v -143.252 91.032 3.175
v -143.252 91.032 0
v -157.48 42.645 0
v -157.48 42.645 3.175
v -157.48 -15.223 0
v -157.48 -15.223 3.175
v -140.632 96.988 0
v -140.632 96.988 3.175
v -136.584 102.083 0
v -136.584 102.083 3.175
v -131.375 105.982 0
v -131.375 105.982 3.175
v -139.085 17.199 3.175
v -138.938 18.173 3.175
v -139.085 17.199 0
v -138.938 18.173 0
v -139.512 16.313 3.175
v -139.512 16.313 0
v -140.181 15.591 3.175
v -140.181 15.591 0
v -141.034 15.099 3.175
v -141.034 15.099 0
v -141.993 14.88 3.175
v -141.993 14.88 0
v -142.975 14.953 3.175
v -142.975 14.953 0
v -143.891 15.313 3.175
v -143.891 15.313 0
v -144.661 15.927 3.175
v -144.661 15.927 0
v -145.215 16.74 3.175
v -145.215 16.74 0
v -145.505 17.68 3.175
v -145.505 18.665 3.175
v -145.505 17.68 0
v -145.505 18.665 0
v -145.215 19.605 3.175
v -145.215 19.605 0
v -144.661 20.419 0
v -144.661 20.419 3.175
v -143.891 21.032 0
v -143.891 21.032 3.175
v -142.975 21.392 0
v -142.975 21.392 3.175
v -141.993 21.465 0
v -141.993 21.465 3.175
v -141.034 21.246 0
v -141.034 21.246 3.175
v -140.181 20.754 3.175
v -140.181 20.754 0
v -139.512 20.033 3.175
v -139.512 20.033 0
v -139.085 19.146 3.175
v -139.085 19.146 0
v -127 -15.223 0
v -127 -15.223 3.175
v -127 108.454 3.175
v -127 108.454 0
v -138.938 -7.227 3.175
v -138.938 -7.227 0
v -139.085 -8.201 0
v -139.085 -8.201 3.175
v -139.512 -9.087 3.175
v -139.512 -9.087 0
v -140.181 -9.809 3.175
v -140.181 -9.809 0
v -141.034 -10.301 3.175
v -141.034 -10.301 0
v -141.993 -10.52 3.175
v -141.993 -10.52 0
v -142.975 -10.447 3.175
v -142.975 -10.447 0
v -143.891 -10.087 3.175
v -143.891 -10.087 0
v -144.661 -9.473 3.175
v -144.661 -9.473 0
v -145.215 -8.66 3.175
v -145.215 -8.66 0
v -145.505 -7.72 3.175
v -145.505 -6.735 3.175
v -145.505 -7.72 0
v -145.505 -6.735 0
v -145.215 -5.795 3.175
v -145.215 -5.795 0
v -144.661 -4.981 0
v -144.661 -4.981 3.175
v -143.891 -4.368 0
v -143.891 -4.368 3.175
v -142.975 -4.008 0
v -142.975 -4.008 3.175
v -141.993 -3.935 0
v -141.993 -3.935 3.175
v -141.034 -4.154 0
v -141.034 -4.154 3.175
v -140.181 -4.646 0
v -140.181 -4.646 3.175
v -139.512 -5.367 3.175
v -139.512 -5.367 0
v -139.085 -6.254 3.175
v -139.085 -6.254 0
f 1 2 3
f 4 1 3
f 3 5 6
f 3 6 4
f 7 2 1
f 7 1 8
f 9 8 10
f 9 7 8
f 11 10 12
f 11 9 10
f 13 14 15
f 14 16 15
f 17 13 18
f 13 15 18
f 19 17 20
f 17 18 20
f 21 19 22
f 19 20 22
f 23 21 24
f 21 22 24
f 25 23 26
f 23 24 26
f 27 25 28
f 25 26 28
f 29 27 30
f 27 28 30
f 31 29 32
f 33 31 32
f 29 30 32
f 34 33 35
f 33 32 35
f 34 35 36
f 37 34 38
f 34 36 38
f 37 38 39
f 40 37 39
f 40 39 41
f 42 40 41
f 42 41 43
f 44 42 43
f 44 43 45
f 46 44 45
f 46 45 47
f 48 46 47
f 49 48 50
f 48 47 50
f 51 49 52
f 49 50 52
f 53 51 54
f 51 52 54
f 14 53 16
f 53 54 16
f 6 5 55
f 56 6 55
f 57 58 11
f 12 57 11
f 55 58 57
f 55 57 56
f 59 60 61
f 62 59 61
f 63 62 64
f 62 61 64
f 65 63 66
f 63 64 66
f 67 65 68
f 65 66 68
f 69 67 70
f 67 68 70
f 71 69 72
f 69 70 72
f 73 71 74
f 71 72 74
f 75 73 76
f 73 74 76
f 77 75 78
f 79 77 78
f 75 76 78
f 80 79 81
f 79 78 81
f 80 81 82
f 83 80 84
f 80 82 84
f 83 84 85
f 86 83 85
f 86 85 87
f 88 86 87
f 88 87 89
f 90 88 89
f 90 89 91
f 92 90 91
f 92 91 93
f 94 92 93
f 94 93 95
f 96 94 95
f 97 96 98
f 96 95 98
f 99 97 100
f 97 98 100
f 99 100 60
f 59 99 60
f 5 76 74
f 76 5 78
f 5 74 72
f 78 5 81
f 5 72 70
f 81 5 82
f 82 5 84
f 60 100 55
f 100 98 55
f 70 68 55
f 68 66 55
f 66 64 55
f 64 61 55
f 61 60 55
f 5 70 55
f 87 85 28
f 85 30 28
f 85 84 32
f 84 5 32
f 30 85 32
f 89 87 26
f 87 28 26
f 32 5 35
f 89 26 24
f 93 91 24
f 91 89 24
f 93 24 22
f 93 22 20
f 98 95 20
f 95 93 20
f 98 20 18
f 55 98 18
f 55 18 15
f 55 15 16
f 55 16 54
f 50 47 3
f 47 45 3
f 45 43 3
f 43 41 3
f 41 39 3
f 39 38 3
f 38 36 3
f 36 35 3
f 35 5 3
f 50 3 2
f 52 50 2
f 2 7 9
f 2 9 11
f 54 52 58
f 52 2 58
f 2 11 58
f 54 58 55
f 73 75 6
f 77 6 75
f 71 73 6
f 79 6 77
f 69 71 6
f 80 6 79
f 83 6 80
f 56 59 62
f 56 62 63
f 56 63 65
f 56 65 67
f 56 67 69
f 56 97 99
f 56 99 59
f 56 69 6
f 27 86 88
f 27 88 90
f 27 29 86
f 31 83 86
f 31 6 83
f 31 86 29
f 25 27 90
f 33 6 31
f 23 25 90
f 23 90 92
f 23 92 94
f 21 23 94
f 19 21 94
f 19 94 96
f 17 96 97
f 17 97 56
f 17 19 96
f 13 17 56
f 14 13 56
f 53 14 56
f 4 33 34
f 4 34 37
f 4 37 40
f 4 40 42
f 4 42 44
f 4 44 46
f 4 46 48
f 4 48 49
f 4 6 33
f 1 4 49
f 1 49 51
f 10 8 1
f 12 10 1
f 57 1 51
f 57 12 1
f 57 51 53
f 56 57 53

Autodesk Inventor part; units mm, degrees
ref_plane "YZ Plane" through (0, 0, 0) normal (1, 0, 0) x (0, 1, 0)
ref_plane "XZ Plane" through (0, 0, 0) normal (0, 1, 0) x (-1, 0, 0)
ref_plane "XY Plane" through (0, 0, 0) normal (0, 0, 1) x (1, 0, 0)
sketch "Sketch1" plane through (0, 0, 0) normal (0, 0, 1) x (1, 0, 0)
  line L0 (-114.3, 77.8543) -> (-127, 77.8543) projected
  line L1 (-127, 77.8543) -> (-163.2323, 36.0005) projected
  arc A0 (-163.2323, 36.0005) -> (-215.9, -105.3078) centre (0, -105.3078) ccw projected
  line L2 (-152.4, -105.3078) -> (-215.9, -105.3078) projected
  arc A1 (152.4, -105.3078) -> (-152.4, -105.3078) centre (0, -105.3078) ccw projected
  line L3 (215.9, -105.3078) -> (152.4, -105.3078) projected
  arc A2 (215.9, -105.3078) -> (163.2323, 36.0005) centre (0, -105.3078) ccw projected
  line L4 (163.2323, 36.0005) -> (127, 77.8543) projected
  line L5 (127, 77.8543) -> (114.3, 77.8543) projected
  line L6 (114.3, 77.8543) -> (114.3, 90.5543) projected
  line L7 (114.3, 90.5543) -> (46.5518, 105.5138) projected
  arc A3 (46.5518, 105.5138) -> (-46.5518, 105.5138) centre (0, -105.3078) ccw projected
  line L8 (-46.5518, 105.5138) -> (-114.3, 90.5543) projected
  line L9 (-114.3, 90.5543) -> (-114.3, 77.8543) projected
  circle A4 centre (-174.6359, -42.9949) radius 3.302 projected
  circle A5 centre (-181.5133, -67.4461) radius 3.302 projected
  circle A6 centre (-184.9846, -92.6078) radius 3.302 projected
  circle A7 centre (-12.7, 63.1241) radius 3.302 projected
  circle A8 centre (-37.8617, 76.2055) radius 3.302 projected
  circle A9 centre (-62.0706, 51.784) radius 3.302 projected
  circle A10 centre (12.7, 63.1241) radius 3.302 projected
  circle A11 centre (62.0706, 51.784) radius 3.302 projected
  circle A12 centre (62.3129, 69.3281) radius 3.302 projected
  circle A13 centre (174.6359, -42.9949) radius 3.302 projected
  circle A14 centre (164.6231, -67.4949) radius 3.302 projected
  circle A15 centre (181.5133, -67.4461) radius 3.302 projected
  circle A16 centre (184.9846, -92.6078) radius 3.302 projected
  circle A17 centre (168.4319, -92.6078) radius 3.302 projected
  circle A18 centre (157.0918, -43.2372) radius 3.302 projected
  circle A19 centre (37.8617, 76.2055) radius 3.302 projected
  circle A20 centre (37.8128, 59.3154) radius 3.302 projected
  circle A21 centre (12.7, 79.6768) radius 3.302 projected
  circle A22 centre (-62.3129, 69.3281) radius 3.302 projected
  circle A23 centre (-37.8128, 59.3154) radius 3.302 projected
  circle A24 centre (-12.7, 79.6768) radius 3.302 projected
  circle A25 centre (-168.4319, -92.6078) radius 3.302 projected
  circle A26 centre (-164.6231, -67.4949) radius 3.302 projected
  circle A27 centre (-157.0918, -43.2372) radius 3.302 projected
  line L10 (-127, 143.7166) -> (-127, -105.3078) projected
  line L11 (-127, -21.0655) -> (-127, 108.4537)
  line L12 (-142.24, -21.0655) -> (-142.24, 38.6612) construction
  circle A28 centre (-142.24, -7.2274) radius 3.302
  circle A29 centre (-142.24, 18.1726) radius 3.302
  line L13 (-157.48, -21.0655) -> (-157.48, 42.6453)
  line L14 (-127, -21.0655) -> (-157.48, -21.0655)
  line L15 (-127, 108.4537) -> (-131.3752, 105.9825)
  line L16 (-143.2518, 91.0321) -> (-157.48, 42.6453)
  arc A30 (-131.3752, 105.9825) -> (-143.2518, 91.0321) centre (-118.8834, 83.8665) ccw
  circle A31 centre (142.24, 14.8706) radius 3.302 projected
  circle A32 centre (-142.24, 14.8706) radius 3.302 projected
  circle A33 centre (-142.24, -10.5294) radius 3.302 projected
  circle A34 centre (142.24, -10.5294) radius 3.302 projected
  point P0 (0, 0)
  dimension "d1" = 6.604
  dimension "d2" = 6.604
  dimension "d3" = 25.4
  dimension "d6" = 15.24
  dimension "d7" = 15.24
  dimension "d8" = 25.4
extrude "Extrusion1" add sketch "Sketch1" along normal blind 3.175 contours L10 L14 L13 L1 | L1 L16 A30 L15 L10 | A28 A33 | A29 A32 picked at (-142.4059, -12.7065) picked at (-142.4059, 12.6935)
sketch "Sketch2" plane through (0, 0, 0) normal (0, 0, -1) x (-1, 0, 0)
  line L0 (127, -21.0655) -> (127, 108.4537) projected
  line L1 (157.48, 42.6453) -> (157.48, -21.0655) projected
  line L2 (127, -21.0655) -> (157.48, -21.0655)
  line L3 (157.48, -21.0655) -> (157.48, -15.2234)
  line L4 (157.48, -15.2234) -> (127, -15.2234)
  line L5 (127, -15.2234) -> (127, -21.0655)
  point P0 (0, 0)
extrude "Extrusion2" cut sketch "Sketch2" against normal blind 25.4
properties part number "16in coil holder plate" material "UHMW, Black"
